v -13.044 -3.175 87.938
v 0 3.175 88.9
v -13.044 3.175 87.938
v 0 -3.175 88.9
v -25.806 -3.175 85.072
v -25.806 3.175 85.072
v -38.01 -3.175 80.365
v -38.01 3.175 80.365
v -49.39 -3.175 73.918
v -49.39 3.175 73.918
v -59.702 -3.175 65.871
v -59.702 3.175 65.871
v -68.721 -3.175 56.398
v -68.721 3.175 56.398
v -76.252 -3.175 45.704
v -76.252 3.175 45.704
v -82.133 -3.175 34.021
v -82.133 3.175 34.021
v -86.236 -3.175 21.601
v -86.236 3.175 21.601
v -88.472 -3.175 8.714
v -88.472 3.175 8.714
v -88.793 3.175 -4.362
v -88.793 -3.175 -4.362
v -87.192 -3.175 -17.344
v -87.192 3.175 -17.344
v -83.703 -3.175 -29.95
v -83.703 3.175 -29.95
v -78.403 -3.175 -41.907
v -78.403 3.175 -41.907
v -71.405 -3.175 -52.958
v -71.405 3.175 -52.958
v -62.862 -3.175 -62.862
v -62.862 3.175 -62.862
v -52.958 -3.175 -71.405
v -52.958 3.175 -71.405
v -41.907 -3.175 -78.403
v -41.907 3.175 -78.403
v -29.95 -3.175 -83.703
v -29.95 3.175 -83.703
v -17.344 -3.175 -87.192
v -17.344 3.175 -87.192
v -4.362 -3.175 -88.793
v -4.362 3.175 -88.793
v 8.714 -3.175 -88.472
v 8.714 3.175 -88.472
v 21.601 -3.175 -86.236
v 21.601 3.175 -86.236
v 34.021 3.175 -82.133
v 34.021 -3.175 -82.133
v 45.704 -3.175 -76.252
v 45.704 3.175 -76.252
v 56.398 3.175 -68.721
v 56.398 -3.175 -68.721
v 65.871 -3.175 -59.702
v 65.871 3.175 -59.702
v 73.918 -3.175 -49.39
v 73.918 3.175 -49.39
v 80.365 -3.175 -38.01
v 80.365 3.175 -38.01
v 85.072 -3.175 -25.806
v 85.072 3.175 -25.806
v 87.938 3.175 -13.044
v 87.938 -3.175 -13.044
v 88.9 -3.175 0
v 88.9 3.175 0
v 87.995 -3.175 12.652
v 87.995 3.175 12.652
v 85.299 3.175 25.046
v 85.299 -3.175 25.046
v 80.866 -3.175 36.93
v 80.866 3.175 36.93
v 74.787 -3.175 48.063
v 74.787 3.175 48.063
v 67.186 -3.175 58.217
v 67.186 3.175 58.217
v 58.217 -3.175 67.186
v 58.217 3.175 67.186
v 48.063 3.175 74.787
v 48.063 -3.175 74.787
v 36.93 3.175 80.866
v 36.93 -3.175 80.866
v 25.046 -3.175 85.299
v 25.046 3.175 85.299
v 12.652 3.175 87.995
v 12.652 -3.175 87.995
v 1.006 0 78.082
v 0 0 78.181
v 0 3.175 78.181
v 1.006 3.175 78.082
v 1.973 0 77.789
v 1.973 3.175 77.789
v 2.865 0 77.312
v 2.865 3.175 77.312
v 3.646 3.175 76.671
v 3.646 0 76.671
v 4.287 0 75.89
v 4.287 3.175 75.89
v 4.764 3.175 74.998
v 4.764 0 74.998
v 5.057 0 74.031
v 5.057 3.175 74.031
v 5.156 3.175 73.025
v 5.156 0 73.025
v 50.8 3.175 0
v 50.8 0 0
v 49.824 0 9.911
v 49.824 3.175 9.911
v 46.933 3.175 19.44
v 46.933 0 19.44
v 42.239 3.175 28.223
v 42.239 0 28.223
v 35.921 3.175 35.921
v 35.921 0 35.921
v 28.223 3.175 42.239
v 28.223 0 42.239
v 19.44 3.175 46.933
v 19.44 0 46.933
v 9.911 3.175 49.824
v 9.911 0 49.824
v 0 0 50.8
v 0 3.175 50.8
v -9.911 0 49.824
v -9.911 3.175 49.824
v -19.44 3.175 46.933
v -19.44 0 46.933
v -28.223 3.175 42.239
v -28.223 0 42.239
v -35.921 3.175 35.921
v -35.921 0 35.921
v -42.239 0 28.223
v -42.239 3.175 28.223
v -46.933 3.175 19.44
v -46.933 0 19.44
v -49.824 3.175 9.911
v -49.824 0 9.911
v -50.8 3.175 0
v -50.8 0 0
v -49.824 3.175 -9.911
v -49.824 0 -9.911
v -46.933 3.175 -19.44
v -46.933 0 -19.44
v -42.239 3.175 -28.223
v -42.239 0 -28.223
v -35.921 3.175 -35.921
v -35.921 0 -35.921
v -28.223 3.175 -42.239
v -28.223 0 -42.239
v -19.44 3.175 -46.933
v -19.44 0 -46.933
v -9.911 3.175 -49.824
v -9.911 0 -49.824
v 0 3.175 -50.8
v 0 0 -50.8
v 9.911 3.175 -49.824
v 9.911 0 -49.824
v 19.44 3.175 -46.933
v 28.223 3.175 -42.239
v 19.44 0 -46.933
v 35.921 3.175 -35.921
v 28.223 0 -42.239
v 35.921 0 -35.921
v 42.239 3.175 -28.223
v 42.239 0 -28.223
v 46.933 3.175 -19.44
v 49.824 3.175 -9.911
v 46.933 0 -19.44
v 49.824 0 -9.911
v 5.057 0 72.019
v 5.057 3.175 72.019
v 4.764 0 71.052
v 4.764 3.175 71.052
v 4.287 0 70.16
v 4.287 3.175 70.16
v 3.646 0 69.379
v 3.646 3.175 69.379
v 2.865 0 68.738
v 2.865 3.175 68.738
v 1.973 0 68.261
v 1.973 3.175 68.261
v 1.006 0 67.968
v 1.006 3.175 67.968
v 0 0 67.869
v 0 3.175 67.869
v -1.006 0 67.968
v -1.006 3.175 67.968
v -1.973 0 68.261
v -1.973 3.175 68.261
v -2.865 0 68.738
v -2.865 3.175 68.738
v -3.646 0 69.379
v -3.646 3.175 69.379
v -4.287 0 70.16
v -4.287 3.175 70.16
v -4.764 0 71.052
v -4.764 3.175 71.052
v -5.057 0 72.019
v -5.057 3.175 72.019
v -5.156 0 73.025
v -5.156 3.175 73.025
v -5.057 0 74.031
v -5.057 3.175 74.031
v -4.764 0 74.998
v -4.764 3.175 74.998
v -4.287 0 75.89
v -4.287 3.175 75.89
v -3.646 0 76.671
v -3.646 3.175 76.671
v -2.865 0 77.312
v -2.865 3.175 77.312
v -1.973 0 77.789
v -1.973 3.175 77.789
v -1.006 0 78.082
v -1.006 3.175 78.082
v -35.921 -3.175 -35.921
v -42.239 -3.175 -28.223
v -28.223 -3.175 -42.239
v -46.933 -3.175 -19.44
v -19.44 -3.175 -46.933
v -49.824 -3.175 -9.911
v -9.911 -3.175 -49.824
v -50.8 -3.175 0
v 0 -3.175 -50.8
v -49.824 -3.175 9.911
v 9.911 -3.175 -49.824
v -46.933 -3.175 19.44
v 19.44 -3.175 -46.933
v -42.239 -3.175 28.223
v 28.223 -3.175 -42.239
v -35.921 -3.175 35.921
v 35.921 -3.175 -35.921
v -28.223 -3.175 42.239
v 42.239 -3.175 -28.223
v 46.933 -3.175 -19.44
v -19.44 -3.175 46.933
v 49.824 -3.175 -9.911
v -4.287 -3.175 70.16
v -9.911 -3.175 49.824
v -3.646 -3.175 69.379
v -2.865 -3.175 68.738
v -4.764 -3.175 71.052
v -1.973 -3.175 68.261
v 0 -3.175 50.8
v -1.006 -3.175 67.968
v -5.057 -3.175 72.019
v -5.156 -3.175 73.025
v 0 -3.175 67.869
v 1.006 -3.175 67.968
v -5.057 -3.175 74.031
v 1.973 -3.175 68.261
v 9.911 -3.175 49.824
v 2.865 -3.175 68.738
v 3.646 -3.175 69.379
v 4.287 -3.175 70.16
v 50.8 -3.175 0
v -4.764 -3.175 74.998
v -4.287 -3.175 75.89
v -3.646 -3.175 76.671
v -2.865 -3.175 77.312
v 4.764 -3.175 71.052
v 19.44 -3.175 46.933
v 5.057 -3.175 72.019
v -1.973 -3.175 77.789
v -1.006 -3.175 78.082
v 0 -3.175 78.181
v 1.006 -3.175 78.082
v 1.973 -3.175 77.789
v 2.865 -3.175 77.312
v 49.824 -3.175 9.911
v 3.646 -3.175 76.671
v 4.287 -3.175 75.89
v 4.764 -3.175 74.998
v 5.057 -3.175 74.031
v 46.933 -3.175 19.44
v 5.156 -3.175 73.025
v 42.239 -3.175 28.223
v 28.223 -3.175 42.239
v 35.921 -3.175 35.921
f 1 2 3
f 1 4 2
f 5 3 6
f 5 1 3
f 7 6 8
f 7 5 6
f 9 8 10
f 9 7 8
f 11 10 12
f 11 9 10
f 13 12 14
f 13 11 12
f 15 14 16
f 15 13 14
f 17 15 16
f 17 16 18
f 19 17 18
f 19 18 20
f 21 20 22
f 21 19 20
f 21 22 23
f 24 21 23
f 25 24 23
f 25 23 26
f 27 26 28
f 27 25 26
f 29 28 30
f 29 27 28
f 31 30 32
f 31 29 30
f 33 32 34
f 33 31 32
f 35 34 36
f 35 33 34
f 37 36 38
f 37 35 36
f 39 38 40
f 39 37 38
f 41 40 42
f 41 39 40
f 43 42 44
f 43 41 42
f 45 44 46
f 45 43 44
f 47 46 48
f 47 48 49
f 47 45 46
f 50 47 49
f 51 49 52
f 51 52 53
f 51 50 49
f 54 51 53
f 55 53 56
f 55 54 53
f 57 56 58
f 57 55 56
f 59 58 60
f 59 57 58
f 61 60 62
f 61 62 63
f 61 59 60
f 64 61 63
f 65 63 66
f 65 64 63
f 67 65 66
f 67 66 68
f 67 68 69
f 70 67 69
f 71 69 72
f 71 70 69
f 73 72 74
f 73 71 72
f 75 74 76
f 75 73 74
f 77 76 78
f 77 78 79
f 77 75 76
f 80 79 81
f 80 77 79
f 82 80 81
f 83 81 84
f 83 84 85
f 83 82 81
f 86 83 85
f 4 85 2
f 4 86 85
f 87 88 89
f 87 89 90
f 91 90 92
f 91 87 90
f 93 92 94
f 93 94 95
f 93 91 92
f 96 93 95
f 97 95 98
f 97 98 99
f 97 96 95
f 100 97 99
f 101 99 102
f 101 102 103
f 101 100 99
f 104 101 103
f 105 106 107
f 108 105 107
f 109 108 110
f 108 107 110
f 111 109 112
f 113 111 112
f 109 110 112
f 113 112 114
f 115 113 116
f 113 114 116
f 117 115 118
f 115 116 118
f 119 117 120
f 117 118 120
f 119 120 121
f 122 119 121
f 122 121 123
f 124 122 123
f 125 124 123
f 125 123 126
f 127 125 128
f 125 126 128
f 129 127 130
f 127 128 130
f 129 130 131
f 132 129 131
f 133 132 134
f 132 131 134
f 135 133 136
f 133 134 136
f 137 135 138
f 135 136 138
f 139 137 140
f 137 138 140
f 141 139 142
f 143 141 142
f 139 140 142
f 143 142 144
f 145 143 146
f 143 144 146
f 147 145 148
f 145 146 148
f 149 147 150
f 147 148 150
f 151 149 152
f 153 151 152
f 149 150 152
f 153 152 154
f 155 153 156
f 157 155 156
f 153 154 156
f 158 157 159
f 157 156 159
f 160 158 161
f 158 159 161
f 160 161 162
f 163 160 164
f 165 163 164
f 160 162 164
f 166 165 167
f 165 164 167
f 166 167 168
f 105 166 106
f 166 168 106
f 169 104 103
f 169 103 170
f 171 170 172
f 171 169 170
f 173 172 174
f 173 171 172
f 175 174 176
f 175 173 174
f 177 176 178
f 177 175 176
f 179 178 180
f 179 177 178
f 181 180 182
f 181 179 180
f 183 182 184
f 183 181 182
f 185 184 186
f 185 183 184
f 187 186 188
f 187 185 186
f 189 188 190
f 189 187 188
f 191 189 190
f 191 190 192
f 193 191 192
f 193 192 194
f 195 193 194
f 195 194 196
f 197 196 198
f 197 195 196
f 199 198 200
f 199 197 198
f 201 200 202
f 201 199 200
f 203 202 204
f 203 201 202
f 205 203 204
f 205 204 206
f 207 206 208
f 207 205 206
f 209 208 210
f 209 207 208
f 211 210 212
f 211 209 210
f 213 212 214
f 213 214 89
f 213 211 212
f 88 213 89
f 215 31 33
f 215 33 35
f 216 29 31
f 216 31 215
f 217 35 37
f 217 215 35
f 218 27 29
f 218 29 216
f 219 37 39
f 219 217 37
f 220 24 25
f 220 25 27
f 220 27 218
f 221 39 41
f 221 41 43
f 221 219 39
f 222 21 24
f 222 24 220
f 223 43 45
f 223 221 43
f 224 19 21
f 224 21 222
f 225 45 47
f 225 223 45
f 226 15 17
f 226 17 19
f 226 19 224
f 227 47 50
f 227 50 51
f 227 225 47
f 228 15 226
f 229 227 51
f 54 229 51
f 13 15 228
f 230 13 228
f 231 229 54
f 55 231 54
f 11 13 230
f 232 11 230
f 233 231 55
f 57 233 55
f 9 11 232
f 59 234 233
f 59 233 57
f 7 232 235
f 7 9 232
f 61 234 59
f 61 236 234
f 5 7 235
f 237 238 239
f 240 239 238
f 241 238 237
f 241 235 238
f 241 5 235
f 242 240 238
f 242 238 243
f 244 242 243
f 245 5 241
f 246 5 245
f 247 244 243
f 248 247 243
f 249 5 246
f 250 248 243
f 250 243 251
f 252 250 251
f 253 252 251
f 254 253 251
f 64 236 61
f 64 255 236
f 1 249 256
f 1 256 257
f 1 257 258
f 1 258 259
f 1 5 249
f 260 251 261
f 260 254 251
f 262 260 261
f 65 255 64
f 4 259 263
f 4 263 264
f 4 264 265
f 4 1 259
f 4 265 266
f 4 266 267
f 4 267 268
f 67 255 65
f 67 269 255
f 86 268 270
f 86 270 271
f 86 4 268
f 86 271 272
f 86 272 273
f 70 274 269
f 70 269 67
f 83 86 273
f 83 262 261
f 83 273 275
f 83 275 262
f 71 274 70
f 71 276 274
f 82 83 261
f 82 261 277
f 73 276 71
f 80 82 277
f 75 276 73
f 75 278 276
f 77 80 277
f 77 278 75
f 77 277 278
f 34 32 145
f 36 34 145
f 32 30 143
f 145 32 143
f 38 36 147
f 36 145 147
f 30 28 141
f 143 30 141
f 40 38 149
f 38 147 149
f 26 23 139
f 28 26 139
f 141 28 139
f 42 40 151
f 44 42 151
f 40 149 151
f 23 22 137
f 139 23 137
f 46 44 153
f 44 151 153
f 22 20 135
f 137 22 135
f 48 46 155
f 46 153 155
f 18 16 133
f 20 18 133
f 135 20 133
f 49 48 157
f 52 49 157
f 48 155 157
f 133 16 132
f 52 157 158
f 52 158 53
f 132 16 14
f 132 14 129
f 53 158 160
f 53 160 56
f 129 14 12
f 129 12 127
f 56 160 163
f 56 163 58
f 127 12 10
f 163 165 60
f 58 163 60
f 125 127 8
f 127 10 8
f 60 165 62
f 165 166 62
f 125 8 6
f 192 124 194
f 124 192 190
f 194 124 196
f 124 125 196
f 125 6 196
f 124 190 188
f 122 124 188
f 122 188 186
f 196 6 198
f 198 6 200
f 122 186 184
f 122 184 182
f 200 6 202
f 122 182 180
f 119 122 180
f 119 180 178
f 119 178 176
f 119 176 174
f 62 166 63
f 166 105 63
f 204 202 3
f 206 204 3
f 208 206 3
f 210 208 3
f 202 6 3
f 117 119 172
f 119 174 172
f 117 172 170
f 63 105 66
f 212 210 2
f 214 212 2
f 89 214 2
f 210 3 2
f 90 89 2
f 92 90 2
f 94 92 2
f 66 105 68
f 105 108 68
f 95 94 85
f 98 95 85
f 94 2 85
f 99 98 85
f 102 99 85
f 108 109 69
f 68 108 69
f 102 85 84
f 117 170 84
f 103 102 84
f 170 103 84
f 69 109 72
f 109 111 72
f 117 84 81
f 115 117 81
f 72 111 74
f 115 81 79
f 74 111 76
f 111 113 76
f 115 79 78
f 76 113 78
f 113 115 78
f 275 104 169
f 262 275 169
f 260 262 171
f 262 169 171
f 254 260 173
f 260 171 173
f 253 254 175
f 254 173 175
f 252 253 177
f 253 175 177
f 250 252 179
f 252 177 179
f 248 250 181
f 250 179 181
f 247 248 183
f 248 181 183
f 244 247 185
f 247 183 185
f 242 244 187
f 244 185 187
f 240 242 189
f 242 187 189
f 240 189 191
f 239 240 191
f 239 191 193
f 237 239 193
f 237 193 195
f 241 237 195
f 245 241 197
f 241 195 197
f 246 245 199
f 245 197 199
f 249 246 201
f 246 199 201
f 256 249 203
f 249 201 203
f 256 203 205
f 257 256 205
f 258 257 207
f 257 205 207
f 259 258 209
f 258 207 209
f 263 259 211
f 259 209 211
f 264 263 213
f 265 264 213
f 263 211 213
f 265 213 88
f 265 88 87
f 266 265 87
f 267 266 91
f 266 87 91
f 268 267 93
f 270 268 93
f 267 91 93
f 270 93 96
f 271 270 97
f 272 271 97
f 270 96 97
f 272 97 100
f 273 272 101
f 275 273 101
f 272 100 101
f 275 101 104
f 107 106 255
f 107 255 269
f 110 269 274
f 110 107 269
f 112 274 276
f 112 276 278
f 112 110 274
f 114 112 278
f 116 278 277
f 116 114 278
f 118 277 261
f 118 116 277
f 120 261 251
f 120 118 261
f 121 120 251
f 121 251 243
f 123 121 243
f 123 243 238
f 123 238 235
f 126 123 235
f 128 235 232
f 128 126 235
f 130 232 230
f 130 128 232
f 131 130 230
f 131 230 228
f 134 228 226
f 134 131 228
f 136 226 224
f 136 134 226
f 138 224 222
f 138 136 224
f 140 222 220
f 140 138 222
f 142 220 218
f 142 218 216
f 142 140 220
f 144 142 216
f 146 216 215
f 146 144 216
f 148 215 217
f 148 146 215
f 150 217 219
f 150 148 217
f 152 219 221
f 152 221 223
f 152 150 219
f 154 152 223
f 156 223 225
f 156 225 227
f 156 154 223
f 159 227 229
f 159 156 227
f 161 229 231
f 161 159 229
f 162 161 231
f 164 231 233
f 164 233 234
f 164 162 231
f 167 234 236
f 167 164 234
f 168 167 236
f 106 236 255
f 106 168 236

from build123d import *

# Parameters (mm, degrees)
F0_R     = 50.8
F1_DEPTH = 3.175


with BuildPart() as f1:
    # F0 (on Front) → F1 (new body, symmetric)
    with BuildSketch(Plane.XZ):
        with BuildLine():
            ThreePointArc((0, 88.9), (-62.861793, -62.861793), (88.9, 0))
            ThreePointArc((88.9, 0), (62.861793, 62.861793), (0, 88.9))
        make_face()
        Circle(F0_R, mode=Mode.SUBTRACT)
        with BuildLine():
            ThreePointArc((5.1562, 73.025), (-3.645984, 69.379016), (0, 78.1812))
            ThreePointArc((0, 78.1812), (3.645984, 76.670984), (5.1562, 73.025))
        make_face(mode=Mode.SUBTRACT)
    extrude(amount=F1_DEPTH, both=True)


solid = f1.part
